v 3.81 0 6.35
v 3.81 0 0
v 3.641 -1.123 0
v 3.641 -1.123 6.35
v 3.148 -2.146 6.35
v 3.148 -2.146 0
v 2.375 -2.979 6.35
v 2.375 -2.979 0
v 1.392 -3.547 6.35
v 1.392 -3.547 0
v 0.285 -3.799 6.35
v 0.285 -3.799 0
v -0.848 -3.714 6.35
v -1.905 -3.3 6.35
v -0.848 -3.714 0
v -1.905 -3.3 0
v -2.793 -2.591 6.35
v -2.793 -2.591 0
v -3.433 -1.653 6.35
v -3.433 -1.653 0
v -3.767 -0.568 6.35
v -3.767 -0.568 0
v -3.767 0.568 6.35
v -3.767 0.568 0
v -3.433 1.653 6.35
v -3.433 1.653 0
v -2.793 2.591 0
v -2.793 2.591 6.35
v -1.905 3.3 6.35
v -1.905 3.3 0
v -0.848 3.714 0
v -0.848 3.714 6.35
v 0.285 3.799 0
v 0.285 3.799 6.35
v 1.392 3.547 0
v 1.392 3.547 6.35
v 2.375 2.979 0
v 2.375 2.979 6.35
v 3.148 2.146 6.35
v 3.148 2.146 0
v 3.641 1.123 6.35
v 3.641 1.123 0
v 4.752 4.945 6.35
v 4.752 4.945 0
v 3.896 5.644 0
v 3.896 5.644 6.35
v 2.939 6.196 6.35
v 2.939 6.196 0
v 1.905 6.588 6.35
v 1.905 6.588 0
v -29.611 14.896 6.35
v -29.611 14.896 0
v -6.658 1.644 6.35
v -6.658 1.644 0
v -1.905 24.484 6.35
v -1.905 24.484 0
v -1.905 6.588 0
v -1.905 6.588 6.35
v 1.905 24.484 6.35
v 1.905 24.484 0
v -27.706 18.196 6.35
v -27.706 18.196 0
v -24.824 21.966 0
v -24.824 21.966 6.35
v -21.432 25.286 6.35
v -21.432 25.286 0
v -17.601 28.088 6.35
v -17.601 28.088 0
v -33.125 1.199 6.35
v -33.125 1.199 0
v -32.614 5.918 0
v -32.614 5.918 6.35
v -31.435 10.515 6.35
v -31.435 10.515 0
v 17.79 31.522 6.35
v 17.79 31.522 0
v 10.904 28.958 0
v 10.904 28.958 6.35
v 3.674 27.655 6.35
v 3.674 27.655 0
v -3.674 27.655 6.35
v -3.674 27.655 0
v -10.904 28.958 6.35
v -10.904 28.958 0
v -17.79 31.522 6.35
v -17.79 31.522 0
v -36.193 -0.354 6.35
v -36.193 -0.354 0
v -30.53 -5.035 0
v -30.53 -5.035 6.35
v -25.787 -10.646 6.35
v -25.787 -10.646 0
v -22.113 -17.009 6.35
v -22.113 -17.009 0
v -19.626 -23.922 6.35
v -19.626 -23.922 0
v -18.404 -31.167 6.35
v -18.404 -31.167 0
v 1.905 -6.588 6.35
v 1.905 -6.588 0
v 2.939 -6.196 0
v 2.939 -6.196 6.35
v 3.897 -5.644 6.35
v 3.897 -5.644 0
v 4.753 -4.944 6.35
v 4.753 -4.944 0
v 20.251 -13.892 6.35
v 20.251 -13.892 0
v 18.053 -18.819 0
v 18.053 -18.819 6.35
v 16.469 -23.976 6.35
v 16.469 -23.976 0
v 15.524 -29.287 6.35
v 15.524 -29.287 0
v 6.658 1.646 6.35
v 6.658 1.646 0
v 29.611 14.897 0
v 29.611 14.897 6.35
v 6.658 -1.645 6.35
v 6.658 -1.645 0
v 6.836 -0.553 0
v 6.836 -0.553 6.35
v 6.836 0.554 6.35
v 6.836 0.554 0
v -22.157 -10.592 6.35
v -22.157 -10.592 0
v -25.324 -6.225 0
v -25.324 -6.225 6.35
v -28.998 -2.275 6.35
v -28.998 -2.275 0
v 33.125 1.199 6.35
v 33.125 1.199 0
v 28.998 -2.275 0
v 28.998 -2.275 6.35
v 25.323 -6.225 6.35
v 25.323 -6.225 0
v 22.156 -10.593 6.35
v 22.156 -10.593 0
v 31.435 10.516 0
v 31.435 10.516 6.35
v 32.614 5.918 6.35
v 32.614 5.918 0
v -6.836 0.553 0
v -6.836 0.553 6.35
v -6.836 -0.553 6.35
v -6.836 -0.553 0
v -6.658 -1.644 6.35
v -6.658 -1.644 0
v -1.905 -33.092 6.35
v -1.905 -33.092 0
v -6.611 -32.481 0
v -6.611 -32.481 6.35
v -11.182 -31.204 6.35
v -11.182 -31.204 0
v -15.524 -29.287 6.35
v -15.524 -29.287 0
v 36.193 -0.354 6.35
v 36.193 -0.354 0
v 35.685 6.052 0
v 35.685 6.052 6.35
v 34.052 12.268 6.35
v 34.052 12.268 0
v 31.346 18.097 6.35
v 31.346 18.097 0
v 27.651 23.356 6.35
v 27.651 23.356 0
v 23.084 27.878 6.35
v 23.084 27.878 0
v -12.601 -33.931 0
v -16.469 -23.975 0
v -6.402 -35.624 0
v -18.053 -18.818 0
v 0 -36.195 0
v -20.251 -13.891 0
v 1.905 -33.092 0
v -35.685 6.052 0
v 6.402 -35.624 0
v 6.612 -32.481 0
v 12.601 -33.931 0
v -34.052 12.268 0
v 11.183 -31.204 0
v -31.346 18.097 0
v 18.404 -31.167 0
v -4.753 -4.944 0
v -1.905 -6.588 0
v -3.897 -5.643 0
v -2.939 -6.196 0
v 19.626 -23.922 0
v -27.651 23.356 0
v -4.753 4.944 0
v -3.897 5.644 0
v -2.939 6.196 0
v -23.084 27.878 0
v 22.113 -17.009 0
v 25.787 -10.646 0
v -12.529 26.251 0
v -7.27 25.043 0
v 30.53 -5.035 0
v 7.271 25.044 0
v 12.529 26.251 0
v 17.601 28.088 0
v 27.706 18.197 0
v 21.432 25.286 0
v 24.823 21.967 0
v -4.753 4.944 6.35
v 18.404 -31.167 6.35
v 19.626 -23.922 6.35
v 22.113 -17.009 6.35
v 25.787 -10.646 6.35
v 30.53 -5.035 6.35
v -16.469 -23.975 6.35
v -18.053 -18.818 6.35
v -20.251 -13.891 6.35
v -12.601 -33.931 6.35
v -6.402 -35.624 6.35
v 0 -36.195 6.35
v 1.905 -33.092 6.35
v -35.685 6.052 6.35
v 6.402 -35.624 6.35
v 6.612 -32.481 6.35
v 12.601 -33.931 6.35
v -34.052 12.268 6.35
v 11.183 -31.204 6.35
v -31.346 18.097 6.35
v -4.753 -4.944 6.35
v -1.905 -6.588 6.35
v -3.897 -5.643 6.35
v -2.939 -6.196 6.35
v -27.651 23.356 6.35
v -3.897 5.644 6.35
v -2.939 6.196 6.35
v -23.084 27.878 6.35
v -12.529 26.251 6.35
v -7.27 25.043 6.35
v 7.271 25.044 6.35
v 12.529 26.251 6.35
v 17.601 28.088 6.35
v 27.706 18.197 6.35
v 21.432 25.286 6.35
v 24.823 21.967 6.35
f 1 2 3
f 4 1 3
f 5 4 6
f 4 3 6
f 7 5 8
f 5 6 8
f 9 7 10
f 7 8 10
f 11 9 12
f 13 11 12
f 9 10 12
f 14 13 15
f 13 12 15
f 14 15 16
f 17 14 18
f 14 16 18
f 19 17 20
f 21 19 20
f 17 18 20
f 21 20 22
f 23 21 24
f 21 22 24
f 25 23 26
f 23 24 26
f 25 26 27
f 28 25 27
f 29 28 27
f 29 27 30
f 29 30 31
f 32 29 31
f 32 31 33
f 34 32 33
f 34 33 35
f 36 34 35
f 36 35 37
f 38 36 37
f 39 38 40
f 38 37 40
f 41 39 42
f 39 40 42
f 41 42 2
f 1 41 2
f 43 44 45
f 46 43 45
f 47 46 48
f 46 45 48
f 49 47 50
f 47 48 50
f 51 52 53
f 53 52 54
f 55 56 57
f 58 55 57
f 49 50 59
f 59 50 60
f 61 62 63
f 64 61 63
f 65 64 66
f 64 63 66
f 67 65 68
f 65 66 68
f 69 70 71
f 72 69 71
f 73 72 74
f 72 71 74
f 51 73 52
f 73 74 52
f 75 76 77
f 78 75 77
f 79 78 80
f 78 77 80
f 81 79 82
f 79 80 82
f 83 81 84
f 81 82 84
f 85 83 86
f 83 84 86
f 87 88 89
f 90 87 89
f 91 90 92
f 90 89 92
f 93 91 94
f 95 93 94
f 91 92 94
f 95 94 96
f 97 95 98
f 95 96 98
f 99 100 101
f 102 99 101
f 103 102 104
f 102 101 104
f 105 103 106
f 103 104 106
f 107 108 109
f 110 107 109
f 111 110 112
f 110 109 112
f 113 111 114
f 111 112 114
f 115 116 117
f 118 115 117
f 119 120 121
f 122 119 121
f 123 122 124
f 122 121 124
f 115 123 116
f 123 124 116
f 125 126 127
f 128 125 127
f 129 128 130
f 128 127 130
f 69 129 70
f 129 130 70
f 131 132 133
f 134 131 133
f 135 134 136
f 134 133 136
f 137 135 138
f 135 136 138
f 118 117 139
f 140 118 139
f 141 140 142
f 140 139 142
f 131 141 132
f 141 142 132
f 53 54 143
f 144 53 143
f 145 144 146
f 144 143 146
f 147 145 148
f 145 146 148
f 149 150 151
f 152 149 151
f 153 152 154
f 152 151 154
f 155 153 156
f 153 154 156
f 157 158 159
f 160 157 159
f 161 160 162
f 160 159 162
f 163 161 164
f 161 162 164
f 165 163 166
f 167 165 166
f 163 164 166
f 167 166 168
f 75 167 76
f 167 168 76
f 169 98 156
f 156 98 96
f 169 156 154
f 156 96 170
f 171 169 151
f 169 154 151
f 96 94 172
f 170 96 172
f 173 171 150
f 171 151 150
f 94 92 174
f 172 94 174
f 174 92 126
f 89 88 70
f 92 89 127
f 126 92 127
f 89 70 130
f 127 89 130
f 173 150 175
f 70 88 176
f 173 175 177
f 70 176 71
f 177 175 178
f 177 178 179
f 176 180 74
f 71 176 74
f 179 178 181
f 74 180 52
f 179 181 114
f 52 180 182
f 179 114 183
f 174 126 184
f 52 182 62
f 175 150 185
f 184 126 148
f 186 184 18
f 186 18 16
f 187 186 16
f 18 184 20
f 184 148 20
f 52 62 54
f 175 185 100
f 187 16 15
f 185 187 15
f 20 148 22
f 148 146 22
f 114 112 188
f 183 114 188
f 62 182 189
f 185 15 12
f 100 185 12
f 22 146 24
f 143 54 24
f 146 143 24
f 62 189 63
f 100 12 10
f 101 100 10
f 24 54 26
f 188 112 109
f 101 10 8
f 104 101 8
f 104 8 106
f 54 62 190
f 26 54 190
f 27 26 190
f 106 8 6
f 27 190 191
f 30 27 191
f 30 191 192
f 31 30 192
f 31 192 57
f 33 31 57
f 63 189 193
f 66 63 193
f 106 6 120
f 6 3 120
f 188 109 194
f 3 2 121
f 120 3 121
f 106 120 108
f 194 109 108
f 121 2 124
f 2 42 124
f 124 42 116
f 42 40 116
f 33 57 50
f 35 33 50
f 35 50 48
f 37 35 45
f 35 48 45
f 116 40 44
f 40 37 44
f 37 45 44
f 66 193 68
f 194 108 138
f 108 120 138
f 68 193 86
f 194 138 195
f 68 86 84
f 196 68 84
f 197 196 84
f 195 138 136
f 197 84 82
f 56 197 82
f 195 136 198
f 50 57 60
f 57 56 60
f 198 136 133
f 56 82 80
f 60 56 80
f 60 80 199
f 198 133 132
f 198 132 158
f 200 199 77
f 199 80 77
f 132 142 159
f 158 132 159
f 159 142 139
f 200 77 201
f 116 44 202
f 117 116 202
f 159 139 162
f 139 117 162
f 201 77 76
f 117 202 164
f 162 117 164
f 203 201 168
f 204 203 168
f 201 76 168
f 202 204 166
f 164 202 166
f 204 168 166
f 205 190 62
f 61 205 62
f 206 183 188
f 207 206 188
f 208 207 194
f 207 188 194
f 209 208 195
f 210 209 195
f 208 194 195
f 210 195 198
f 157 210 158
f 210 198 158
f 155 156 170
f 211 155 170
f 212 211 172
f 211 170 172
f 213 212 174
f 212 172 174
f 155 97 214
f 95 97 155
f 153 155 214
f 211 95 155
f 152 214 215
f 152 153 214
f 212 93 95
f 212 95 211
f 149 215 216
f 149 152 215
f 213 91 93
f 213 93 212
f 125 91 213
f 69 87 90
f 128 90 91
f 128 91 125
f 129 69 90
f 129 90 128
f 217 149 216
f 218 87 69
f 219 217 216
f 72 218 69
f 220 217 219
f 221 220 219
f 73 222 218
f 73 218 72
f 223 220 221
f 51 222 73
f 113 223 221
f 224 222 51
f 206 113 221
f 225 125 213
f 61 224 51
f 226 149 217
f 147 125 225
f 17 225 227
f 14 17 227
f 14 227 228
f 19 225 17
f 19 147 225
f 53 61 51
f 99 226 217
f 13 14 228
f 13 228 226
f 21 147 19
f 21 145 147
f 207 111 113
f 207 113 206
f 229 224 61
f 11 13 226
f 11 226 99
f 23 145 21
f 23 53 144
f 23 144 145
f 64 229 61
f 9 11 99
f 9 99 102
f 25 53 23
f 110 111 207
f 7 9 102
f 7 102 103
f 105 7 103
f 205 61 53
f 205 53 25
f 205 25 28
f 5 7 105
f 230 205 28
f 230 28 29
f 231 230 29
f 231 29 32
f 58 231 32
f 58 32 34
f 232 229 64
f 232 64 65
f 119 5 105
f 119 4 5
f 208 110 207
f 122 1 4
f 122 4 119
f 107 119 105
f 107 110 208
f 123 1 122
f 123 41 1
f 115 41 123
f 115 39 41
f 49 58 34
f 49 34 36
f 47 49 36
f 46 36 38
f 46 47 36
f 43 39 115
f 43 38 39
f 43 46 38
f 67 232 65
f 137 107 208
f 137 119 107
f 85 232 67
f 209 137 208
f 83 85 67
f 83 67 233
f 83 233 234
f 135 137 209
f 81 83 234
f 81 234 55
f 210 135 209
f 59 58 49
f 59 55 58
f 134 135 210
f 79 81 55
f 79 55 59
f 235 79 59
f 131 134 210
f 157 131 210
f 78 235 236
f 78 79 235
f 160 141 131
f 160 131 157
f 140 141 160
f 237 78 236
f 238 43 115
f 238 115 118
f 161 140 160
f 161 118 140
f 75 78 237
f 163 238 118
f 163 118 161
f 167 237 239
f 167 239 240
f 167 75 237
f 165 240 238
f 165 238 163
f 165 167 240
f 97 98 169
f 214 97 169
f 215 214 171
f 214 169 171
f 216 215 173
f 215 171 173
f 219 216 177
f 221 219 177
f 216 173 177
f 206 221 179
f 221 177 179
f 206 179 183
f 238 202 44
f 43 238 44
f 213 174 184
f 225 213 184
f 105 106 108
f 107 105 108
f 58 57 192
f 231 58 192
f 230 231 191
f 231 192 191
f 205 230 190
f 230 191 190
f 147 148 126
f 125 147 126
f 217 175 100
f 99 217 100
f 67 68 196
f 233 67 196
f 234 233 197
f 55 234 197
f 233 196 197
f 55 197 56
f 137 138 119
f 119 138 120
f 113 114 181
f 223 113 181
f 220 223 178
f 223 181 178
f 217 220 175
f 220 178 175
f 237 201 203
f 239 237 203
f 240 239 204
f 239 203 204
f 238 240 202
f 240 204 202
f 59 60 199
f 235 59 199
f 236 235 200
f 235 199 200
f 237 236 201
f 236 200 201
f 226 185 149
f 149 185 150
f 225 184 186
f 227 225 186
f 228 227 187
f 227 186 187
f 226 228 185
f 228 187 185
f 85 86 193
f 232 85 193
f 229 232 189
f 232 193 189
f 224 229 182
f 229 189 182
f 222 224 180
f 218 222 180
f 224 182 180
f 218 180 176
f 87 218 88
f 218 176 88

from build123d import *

# Parameters (mm, degrees)
F1_DEPTH = 6.35


with BuildPart() as f1:
    # F0 (on Top) → F1 (new body)
    with BuildSketch(Plane.XY):
        with BuildLine():
            ThreePointArc((17.789634, 31.521532), (0, 27.491055), (-17.789634, 31.521532))
            ThreePointArc((-17.789634, 31.521532), (-31.345789, 18.0975), (-36.193264, -0.354491))
            ThreePointArc((-36.193264, -0.354491), (-23.807952, -13.745528), (-18.40363, -31.167041))
            ThreePointArc((-18.40363, -31.167041), (0, -36.195), (18.40363, -31.167041))
            ThreePointArc((18.40363, -31.167041), (23.807952, -13.745528), (36.193264, -0.354491))
            ThreePointArc((36.193264, -0.354491), (31.345789, 18.0975), (17.789634, 31.521532))
        make_face()
        with BuildLine():
            ThreePointArc((-1.904548, -33.092239), (-8.919605, -31.924352), (-15.524087, -29.286965))
            ThreePointArc((-15.524087, -29.286965), (-17.182659, -21.372657), (-20.251486, -13.891384))
            Line((-20.251486, -13.891384), (-4.753306, -4.943505))
            ThreePointArc((-4.753306, -4.943505), (-3.429, -5.939202), (-1.904548, -6.588237))
            Line((-1.904548, -6.588237), (-1.904548, -33.092239))
        make_face(mode=Mode.SUBTRACT)
        with BuildLine():
            ThreePointArc((15.524087, -29.286965), (8.920041, -31.92423), (1.905452, -33.092187))
            Line((1.905452, -33.092187), (1.905452, -6.587975))
            ThreePointArc((1.905452, -6.587975), (3.429, -5.939202), (4.752628, -4.944157))
            Line((4.752628, -4.944157), (20.251068, -13.892186))
            ThreePointArc((20.251068, -13.892186), (17.182526, -21.373089), (15.524087, -29.286965))
        make_face(mode=Mode.SUBTRACT)
        with BuildLine():
            Line((-29.611197, 14.896328), (-6.657967, 1.644275))
            ThreePointArc((-6.657967, 1.644275), (-6.858, 0.000235), (-6.65808, -1.643818))
            Line((-6.65808, -1.643818), (-22.15652, -10.591846))
            ThreePointArc((-22.15652, -10.591846), (-27.100901, -4.19396), (-33.125299, 1.199229))
            ThreePointArc((-33.125299, 1.199229), (-32.107159, 8.237352), (-29.611197, 14.896328))
        make_face(mode=Mode.SUBTRACT)
        with BuildLine():
            Line((-4.752967, 4.943831), (-27.706197, 18.195885))
            ThreePointArc((-27.706197, 18.195885), (-23.187335, 23.686939), (-17.601212, 28.087736))
            ThreePointArc((-17.601212, 28.087736), (-9.917934, 25.566948), (-1.904548, 24.483993))
            Line((-1.904548, 24.483993), (-1.904548, 6.588237))
            ThreePointArc((-1.904548, 6.588237), (-3.428796, 5.93932), (-4.752967, 4.943831))
        make_face(mode=Mode.SUBTRACT)
        with BuildLine():
            ThreePointArc((-3.81, 0), (0, 3.81), (3.81, 0))
            ThreePointArc((3.81, 0), (0, -3.81), (-3.81, 0))
        make_face(mode=Mode.SUBTRACT)
        with BuildLine():
            ThreePointArc((29.610627, 14.897462), (32.107001, 8.237967), (33.125299, 1.199229))
            ThreePointArc((33.125299, 1.199229), (27.100593, -4.194291), (22.156034, -10.59261))
            Line((22.156034, -10.59261), (6.657854, -1.644731))
            ThreePointArc((6.657854, -1.644731), (6.858, 0.000424), (6.657651, 1.645555))
            Line((6.657651, 1.645555), (29.610627, 14.897462))
        make_face(mode=Mode.SUBTRACT)
        with BuildLine():
            ThreePointArc((17.601212, 28.087736), (23.186882, 23.687383), (27.705501, 18.196946))
            Line((27.705501, 18.196946), (4.752016, 4.944745))
            ThreePointArc((4.752016, 4.944745), (3.428632, 5.939414), (1.905452, 6.587975))
            Line((1.905452, 6.587975), (1.905452, 24.484032))
            ThreePointArc((1.905452, 24.484032), (9.918375, 25.567049), (17.601212, 28.087736))
        make_face(mode=Mode.SUBTRACT)
    extrude(amount=F1_DEPTH)


solid = f1.part
